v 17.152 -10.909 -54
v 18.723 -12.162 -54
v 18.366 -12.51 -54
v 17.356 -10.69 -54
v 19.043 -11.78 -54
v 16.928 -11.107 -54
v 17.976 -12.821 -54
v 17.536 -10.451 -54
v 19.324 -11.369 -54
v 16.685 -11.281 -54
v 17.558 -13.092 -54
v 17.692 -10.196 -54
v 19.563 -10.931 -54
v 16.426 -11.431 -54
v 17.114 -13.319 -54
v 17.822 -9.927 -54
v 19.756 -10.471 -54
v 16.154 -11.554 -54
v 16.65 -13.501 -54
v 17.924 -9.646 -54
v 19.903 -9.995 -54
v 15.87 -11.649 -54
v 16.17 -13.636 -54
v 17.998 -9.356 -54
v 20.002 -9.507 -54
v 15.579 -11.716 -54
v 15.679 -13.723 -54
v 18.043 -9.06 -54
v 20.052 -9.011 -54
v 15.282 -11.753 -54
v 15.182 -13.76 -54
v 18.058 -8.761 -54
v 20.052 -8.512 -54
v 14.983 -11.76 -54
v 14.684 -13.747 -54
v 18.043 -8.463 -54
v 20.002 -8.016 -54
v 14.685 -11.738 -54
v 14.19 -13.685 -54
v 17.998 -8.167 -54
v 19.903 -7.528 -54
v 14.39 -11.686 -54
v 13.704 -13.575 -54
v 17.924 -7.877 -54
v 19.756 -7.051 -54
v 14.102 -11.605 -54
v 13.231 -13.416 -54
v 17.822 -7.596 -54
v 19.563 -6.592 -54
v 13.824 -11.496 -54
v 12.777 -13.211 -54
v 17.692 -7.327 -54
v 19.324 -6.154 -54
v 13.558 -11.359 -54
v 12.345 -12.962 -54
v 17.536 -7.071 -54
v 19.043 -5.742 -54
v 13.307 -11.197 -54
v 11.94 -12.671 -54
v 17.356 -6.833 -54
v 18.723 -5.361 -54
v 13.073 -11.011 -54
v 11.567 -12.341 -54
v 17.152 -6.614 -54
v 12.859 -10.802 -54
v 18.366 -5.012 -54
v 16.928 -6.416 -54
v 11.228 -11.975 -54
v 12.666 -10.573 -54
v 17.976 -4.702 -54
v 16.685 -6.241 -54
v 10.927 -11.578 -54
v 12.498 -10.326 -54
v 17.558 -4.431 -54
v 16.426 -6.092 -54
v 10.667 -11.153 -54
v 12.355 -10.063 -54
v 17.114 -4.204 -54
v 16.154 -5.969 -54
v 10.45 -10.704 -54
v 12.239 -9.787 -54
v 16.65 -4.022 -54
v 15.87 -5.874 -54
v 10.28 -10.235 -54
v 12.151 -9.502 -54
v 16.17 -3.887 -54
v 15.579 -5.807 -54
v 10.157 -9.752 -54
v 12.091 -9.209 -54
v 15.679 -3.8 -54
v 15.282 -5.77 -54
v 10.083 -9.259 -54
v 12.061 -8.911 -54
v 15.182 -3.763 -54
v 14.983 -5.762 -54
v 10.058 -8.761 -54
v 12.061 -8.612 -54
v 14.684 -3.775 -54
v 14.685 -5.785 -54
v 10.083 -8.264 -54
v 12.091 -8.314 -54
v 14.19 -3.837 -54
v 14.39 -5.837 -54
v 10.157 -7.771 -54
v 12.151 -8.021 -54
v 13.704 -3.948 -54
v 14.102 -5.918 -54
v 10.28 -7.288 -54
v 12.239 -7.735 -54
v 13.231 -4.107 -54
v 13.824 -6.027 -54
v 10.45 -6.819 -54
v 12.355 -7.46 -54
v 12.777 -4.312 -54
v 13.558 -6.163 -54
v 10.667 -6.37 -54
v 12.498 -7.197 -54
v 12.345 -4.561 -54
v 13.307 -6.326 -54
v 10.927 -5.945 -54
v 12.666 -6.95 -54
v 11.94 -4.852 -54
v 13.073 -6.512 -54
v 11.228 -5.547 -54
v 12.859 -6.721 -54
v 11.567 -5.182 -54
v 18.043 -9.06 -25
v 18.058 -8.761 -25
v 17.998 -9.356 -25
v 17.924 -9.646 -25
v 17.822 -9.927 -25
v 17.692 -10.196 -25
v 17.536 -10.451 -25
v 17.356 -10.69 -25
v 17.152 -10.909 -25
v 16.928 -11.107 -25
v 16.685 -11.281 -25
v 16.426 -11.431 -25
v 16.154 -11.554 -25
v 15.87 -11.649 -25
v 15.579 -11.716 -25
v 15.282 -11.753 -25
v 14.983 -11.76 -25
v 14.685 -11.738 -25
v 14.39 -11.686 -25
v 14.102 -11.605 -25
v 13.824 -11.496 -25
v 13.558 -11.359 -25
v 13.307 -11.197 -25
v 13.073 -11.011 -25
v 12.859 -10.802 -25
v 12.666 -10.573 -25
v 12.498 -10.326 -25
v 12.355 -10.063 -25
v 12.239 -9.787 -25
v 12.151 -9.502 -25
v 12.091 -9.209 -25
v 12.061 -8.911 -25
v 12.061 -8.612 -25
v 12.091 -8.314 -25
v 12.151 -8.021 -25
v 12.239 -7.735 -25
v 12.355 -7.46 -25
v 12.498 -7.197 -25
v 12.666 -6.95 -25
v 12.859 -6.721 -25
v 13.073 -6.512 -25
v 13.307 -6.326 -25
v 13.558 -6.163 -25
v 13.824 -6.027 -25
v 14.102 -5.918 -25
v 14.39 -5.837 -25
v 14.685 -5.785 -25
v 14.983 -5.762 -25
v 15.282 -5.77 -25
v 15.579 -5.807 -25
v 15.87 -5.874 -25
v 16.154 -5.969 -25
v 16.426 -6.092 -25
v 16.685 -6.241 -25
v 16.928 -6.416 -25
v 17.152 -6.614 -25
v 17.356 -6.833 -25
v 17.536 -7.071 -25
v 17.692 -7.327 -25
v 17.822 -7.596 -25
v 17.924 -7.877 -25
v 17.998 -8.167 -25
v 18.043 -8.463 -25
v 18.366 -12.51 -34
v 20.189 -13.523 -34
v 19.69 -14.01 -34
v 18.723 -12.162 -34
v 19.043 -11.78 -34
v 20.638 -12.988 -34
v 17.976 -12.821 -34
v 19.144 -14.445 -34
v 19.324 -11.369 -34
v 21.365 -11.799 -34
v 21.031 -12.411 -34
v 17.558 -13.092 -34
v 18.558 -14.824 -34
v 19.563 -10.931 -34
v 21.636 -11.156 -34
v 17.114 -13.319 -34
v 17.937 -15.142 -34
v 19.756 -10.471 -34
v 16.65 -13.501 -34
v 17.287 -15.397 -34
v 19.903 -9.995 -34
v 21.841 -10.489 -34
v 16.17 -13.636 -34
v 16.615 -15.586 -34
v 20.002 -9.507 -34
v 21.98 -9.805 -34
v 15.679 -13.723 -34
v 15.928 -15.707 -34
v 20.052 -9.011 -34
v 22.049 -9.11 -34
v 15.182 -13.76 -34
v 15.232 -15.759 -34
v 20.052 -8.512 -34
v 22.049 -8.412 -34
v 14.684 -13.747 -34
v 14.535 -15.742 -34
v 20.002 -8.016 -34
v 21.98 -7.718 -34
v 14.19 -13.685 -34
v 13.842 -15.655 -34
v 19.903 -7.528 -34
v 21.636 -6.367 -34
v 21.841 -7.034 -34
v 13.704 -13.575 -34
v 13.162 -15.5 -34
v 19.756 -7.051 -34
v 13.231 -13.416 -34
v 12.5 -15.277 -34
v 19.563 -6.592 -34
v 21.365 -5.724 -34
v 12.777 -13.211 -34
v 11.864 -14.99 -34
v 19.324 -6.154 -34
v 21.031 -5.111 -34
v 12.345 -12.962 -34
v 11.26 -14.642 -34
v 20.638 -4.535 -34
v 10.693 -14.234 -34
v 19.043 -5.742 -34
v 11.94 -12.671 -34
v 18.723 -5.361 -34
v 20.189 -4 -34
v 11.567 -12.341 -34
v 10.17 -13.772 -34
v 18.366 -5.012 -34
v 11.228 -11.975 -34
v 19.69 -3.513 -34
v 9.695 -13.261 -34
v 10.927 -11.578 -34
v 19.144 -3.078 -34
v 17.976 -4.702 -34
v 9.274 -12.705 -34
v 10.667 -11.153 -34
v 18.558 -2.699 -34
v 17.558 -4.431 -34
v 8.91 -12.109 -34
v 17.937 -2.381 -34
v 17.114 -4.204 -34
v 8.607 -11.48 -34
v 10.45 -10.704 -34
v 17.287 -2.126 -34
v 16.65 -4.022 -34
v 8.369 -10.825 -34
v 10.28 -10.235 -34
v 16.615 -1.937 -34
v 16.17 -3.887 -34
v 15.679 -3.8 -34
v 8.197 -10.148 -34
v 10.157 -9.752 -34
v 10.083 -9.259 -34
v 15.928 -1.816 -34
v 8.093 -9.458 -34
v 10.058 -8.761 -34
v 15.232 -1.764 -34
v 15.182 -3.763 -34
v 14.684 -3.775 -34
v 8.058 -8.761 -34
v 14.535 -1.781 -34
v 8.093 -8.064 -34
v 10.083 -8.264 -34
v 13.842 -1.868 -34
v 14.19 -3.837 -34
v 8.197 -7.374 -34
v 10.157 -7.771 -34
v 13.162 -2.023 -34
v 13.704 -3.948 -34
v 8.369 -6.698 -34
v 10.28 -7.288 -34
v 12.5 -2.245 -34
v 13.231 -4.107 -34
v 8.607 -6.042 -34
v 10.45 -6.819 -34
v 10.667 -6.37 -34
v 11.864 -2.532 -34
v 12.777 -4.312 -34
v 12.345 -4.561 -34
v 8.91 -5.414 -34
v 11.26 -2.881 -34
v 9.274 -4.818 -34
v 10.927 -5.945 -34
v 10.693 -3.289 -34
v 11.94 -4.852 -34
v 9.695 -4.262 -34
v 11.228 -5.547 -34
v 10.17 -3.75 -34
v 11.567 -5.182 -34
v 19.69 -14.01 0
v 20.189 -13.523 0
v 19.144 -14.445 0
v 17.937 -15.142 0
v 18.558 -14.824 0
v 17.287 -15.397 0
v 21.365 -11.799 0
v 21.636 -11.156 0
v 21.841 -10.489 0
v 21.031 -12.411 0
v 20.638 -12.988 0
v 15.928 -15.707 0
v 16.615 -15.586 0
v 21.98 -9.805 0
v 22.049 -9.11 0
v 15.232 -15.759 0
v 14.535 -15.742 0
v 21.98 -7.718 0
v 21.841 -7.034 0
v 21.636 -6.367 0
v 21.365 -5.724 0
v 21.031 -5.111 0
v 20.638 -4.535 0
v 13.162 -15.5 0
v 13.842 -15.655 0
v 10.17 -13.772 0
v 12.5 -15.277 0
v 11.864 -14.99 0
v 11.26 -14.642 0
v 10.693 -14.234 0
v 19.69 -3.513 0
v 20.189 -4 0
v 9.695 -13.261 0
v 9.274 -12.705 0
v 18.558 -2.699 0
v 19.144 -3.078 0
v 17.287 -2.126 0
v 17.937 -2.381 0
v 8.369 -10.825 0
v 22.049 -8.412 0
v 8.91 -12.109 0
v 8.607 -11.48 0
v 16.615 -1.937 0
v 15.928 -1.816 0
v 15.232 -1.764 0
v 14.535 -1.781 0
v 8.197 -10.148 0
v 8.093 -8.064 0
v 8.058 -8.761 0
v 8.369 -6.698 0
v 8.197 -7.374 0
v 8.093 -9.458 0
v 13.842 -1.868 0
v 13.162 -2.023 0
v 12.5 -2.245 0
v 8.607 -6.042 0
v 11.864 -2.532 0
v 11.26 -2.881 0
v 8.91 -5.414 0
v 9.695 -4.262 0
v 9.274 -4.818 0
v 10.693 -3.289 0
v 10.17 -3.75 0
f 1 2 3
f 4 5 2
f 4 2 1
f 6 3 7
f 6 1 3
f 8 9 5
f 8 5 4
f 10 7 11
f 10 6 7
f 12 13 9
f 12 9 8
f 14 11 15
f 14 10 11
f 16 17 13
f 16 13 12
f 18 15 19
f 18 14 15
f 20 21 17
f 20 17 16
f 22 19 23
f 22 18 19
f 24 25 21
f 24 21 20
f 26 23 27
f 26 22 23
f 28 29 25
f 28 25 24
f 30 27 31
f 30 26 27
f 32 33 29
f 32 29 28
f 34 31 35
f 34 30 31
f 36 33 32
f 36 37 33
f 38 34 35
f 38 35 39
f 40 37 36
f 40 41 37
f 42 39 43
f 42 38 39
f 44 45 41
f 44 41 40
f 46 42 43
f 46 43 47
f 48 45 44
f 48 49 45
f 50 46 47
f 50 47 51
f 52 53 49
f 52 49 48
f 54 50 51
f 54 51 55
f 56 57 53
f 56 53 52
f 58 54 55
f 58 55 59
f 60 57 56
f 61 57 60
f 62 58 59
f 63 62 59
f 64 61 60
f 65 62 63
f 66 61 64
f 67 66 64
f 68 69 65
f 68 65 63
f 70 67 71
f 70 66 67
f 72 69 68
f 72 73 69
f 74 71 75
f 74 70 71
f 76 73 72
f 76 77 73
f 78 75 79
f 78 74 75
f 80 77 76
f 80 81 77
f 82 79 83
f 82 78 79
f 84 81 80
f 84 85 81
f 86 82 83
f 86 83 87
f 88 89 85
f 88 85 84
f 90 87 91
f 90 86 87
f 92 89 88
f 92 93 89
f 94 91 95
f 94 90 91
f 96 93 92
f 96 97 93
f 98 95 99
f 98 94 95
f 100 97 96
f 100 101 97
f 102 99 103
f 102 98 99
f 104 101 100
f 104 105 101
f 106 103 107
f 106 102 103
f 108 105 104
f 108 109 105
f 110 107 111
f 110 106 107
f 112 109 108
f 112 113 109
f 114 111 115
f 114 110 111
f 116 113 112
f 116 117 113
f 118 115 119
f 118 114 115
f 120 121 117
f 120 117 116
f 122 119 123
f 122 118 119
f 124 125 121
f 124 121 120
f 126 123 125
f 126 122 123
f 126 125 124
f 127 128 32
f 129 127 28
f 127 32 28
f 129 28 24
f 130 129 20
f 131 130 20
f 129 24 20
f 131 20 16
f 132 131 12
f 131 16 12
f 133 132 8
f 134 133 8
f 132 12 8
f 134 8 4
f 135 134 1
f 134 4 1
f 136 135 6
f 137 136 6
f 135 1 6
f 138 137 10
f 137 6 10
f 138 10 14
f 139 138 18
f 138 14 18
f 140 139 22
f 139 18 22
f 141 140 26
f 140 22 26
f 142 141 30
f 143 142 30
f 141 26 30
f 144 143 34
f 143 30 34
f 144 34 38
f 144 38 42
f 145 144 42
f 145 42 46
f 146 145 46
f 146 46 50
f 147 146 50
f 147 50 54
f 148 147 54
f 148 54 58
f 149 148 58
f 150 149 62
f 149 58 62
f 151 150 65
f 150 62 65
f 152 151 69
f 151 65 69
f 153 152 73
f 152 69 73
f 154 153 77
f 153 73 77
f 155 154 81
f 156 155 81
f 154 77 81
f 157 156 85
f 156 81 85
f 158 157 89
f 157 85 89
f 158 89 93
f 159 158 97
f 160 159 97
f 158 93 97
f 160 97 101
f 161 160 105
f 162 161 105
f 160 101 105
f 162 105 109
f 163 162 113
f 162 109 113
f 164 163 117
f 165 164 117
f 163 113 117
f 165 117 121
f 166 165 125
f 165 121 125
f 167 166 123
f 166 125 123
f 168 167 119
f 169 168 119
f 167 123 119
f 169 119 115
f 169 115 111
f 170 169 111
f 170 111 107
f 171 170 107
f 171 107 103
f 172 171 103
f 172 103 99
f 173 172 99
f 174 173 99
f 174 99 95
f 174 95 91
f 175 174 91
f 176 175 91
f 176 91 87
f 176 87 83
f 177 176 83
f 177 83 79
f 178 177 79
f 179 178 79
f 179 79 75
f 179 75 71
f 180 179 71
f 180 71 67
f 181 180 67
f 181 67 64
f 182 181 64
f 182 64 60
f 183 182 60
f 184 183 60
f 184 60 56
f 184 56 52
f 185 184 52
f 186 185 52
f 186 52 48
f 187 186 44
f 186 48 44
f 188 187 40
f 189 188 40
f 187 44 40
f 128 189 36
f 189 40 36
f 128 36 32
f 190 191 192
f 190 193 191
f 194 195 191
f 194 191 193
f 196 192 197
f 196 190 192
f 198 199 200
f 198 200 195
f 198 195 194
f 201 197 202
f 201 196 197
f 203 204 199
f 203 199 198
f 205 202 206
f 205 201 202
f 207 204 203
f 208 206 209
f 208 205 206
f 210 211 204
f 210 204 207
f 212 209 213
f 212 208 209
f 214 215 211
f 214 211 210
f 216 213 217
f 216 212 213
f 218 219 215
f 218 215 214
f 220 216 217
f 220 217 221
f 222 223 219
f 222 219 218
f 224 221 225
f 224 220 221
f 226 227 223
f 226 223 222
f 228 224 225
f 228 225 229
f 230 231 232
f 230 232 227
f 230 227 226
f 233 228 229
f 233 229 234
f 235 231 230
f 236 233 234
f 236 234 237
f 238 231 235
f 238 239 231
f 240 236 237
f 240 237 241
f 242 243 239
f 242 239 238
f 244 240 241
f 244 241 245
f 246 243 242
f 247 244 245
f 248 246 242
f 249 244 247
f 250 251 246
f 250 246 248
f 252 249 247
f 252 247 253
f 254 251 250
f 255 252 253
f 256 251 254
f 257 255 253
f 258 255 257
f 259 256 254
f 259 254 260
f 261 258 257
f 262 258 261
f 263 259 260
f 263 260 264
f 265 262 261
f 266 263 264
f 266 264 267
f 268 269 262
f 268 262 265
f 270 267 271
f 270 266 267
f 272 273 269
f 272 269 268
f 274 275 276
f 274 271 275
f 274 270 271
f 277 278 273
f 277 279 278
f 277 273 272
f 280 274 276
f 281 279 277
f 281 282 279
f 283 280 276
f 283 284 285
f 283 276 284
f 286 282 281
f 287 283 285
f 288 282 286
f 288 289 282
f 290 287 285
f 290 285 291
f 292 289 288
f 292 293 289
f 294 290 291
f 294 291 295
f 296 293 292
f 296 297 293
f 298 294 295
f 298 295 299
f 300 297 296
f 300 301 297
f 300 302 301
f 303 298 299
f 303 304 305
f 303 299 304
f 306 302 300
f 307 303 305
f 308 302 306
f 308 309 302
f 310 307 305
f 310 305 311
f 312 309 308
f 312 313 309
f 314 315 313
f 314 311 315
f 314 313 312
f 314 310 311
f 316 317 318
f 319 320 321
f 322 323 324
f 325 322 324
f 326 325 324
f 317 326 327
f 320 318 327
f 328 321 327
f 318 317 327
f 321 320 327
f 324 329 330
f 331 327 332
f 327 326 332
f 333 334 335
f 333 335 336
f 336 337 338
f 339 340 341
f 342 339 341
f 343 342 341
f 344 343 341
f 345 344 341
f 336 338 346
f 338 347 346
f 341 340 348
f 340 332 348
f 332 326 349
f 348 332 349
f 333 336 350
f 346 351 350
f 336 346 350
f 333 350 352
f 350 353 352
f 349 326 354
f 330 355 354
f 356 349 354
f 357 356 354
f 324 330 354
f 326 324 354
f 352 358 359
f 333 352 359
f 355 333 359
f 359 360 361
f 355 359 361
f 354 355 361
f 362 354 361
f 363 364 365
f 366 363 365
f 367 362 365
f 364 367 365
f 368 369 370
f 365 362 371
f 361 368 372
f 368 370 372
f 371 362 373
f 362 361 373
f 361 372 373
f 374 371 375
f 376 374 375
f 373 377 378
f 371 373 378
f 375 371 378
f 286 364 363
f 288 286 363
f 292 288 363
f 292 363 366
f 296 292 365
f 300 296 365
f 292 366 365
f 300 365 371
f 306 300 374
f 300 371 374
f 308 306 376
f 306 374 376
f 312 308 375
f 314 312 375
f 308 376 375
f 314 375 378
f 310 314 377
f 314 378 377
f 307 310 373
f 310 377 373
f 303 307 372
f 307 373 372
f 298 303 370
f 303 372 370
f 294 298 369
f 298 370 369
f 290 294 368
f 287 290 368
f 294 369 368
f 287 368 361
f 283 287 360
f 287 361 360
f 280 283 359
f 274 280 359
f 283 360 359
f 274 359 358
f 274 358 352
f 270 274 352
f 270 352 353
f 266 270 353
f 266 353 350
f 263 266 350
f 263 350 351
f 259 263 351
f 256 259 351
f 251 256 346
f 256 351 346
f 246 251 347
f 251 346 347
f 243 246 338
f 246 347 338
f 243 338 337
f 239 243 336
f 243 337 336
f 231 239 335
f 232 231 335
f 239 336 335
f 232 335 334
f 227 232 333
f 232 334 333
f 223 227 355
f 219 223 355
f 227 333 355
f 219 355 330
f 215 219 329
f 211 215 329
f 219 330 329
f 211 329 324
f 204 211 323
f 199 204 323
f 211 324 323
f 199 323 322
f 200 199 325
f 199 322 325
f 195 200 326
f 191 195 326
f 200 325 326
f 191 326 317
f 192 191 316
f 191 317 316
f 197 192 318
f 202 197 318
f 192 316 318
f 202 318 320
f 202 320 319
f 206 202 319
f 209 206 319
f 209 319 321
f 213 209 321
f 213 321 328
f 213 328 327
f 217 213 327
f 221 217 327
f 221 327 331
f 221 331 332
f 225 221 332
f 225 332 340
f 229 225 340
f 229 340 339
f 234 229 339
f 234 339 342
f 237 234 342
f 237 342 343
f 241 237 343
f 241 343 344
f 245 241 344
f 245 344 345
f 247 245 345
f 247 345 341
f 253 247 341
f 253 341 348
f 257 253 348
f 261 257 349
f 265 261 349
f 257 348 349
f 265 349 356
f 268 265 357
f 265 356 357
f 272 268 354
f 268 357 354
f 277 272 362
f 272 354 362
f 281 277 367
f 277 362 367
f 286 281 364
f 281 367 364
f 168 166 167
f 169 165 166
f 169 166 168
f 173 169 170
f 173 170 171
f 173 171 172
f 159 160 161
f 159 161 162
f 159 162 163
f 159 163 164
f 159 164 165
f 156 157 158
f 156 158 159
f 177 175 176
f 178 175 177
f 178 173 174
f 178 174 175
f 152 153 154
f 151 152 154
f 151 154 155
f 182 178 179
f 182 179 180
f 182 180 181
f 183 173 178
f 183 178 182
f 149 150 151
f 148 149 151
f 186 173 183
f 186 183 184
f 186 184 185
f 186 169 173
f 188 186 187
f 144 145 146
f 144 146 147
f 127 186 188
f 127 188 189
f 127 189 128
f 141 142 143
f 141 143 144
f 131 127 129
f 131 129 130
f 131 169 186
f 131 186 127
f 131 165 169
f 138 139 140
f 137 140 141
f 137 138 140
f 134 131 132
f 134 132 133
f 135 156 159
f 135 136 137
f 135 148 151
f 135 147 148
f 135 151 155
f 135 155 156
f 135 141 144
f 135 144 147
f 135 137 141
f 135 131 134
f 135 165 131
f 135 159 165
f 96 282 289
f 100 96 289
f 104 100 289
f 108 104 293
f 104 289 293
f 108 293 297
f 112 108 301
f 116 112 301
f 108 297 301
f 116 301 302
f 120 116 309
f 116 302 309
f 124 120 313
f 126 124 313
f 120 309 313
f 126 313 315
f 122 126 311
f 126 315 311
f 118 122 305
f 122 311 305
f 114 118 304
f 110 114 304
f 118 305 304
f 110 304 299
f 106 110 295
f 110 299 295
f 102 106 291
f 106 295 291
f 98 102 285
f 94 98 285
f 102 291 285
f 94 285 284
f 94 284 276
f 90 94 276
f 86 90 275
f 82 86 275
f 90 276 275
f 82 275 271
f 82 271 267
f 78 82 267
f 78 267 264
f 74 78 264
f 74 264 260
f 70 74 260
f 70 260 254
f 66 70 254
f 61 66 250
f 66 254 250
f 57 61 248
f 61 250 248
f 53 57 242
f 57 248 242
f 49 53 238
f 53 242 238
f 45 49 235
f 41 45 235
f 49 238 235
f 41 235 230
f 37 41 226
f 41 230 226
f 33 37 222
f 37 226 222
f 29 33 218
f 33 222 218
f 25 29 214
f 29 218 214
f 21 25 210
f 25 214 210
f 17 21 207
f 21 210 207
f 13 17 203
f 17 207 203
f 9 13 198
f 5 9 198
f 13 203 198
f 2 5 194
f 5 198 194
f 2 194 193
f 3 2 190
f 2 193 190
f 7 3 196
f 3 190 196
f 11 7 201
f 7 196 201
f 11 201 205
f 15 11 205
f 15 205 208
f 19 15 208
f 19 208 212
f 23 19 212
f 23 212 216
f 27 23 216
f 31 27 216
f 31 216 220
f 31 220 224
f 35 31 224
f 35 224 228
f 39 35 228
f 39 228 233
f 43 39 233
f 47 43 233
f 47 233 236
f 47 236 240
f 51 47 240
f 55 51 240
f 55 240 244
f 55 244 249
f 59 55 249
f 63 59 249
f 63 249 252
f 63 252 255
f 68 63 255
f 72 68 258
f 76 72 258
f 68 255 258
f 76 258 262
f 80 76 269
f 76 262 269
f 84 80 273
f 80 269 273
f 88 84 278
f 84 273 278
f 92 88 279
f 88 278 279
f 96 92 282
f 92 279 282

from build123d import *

# Parameters (mm, degrees)
SKETCH2_R           = 7
BOSS_EXTRUDE2_DEPTH = 34
SKETCH3_R           = 5
BOSS_EXTRUDE3_DEPTH = 20
SKETCH4_R           = 3
CUT_EXTRUDE1_DEPTH  = 29


with BuildPart() as part:
    # Sketch2 → Boss-Extrude2 (new body)
    with BuildSketch(Plane(origin=(0, 0, 0), x_dir=(-1, 0, 0), z_dir=(0, 0, -1))):
        with Locations((-15.057769352, -8.761383704)):
            Circle(SKETCH2_R)
    extrude(amount=BOSS_EXTRUDE2_DEPTH)

    # Sketch3 → Boss-Extrude3 (add)
    with BuildSketch(Plane(origin=(0, 0, -34), x_dir=(-1, 0, 0), z_dir=(0, 0, -1))):
        with Locations((-15.057769352, -8.761383704)):
            Circle(SKETCH3_R)
    extrude(amount=BOSS_EXTRUDE3_DEPTH)

    # Sketch4 → Cut-Extrude1 (cut)
    with BuildSketch(Plane(origin=(0, 0, -54), x_dir=(-1, 0, 0), z_dir=(0, 0, -1))):
        with Locations(Location((-15.057769352, -8.761383704, 0), (0, 0, 180))):
            Circle(SKETCH4_R)
    extrude(amount=-CUT_EXTRUDE1_DEPTH, mode=Mode.SUBTRACT)


solid = part.part
